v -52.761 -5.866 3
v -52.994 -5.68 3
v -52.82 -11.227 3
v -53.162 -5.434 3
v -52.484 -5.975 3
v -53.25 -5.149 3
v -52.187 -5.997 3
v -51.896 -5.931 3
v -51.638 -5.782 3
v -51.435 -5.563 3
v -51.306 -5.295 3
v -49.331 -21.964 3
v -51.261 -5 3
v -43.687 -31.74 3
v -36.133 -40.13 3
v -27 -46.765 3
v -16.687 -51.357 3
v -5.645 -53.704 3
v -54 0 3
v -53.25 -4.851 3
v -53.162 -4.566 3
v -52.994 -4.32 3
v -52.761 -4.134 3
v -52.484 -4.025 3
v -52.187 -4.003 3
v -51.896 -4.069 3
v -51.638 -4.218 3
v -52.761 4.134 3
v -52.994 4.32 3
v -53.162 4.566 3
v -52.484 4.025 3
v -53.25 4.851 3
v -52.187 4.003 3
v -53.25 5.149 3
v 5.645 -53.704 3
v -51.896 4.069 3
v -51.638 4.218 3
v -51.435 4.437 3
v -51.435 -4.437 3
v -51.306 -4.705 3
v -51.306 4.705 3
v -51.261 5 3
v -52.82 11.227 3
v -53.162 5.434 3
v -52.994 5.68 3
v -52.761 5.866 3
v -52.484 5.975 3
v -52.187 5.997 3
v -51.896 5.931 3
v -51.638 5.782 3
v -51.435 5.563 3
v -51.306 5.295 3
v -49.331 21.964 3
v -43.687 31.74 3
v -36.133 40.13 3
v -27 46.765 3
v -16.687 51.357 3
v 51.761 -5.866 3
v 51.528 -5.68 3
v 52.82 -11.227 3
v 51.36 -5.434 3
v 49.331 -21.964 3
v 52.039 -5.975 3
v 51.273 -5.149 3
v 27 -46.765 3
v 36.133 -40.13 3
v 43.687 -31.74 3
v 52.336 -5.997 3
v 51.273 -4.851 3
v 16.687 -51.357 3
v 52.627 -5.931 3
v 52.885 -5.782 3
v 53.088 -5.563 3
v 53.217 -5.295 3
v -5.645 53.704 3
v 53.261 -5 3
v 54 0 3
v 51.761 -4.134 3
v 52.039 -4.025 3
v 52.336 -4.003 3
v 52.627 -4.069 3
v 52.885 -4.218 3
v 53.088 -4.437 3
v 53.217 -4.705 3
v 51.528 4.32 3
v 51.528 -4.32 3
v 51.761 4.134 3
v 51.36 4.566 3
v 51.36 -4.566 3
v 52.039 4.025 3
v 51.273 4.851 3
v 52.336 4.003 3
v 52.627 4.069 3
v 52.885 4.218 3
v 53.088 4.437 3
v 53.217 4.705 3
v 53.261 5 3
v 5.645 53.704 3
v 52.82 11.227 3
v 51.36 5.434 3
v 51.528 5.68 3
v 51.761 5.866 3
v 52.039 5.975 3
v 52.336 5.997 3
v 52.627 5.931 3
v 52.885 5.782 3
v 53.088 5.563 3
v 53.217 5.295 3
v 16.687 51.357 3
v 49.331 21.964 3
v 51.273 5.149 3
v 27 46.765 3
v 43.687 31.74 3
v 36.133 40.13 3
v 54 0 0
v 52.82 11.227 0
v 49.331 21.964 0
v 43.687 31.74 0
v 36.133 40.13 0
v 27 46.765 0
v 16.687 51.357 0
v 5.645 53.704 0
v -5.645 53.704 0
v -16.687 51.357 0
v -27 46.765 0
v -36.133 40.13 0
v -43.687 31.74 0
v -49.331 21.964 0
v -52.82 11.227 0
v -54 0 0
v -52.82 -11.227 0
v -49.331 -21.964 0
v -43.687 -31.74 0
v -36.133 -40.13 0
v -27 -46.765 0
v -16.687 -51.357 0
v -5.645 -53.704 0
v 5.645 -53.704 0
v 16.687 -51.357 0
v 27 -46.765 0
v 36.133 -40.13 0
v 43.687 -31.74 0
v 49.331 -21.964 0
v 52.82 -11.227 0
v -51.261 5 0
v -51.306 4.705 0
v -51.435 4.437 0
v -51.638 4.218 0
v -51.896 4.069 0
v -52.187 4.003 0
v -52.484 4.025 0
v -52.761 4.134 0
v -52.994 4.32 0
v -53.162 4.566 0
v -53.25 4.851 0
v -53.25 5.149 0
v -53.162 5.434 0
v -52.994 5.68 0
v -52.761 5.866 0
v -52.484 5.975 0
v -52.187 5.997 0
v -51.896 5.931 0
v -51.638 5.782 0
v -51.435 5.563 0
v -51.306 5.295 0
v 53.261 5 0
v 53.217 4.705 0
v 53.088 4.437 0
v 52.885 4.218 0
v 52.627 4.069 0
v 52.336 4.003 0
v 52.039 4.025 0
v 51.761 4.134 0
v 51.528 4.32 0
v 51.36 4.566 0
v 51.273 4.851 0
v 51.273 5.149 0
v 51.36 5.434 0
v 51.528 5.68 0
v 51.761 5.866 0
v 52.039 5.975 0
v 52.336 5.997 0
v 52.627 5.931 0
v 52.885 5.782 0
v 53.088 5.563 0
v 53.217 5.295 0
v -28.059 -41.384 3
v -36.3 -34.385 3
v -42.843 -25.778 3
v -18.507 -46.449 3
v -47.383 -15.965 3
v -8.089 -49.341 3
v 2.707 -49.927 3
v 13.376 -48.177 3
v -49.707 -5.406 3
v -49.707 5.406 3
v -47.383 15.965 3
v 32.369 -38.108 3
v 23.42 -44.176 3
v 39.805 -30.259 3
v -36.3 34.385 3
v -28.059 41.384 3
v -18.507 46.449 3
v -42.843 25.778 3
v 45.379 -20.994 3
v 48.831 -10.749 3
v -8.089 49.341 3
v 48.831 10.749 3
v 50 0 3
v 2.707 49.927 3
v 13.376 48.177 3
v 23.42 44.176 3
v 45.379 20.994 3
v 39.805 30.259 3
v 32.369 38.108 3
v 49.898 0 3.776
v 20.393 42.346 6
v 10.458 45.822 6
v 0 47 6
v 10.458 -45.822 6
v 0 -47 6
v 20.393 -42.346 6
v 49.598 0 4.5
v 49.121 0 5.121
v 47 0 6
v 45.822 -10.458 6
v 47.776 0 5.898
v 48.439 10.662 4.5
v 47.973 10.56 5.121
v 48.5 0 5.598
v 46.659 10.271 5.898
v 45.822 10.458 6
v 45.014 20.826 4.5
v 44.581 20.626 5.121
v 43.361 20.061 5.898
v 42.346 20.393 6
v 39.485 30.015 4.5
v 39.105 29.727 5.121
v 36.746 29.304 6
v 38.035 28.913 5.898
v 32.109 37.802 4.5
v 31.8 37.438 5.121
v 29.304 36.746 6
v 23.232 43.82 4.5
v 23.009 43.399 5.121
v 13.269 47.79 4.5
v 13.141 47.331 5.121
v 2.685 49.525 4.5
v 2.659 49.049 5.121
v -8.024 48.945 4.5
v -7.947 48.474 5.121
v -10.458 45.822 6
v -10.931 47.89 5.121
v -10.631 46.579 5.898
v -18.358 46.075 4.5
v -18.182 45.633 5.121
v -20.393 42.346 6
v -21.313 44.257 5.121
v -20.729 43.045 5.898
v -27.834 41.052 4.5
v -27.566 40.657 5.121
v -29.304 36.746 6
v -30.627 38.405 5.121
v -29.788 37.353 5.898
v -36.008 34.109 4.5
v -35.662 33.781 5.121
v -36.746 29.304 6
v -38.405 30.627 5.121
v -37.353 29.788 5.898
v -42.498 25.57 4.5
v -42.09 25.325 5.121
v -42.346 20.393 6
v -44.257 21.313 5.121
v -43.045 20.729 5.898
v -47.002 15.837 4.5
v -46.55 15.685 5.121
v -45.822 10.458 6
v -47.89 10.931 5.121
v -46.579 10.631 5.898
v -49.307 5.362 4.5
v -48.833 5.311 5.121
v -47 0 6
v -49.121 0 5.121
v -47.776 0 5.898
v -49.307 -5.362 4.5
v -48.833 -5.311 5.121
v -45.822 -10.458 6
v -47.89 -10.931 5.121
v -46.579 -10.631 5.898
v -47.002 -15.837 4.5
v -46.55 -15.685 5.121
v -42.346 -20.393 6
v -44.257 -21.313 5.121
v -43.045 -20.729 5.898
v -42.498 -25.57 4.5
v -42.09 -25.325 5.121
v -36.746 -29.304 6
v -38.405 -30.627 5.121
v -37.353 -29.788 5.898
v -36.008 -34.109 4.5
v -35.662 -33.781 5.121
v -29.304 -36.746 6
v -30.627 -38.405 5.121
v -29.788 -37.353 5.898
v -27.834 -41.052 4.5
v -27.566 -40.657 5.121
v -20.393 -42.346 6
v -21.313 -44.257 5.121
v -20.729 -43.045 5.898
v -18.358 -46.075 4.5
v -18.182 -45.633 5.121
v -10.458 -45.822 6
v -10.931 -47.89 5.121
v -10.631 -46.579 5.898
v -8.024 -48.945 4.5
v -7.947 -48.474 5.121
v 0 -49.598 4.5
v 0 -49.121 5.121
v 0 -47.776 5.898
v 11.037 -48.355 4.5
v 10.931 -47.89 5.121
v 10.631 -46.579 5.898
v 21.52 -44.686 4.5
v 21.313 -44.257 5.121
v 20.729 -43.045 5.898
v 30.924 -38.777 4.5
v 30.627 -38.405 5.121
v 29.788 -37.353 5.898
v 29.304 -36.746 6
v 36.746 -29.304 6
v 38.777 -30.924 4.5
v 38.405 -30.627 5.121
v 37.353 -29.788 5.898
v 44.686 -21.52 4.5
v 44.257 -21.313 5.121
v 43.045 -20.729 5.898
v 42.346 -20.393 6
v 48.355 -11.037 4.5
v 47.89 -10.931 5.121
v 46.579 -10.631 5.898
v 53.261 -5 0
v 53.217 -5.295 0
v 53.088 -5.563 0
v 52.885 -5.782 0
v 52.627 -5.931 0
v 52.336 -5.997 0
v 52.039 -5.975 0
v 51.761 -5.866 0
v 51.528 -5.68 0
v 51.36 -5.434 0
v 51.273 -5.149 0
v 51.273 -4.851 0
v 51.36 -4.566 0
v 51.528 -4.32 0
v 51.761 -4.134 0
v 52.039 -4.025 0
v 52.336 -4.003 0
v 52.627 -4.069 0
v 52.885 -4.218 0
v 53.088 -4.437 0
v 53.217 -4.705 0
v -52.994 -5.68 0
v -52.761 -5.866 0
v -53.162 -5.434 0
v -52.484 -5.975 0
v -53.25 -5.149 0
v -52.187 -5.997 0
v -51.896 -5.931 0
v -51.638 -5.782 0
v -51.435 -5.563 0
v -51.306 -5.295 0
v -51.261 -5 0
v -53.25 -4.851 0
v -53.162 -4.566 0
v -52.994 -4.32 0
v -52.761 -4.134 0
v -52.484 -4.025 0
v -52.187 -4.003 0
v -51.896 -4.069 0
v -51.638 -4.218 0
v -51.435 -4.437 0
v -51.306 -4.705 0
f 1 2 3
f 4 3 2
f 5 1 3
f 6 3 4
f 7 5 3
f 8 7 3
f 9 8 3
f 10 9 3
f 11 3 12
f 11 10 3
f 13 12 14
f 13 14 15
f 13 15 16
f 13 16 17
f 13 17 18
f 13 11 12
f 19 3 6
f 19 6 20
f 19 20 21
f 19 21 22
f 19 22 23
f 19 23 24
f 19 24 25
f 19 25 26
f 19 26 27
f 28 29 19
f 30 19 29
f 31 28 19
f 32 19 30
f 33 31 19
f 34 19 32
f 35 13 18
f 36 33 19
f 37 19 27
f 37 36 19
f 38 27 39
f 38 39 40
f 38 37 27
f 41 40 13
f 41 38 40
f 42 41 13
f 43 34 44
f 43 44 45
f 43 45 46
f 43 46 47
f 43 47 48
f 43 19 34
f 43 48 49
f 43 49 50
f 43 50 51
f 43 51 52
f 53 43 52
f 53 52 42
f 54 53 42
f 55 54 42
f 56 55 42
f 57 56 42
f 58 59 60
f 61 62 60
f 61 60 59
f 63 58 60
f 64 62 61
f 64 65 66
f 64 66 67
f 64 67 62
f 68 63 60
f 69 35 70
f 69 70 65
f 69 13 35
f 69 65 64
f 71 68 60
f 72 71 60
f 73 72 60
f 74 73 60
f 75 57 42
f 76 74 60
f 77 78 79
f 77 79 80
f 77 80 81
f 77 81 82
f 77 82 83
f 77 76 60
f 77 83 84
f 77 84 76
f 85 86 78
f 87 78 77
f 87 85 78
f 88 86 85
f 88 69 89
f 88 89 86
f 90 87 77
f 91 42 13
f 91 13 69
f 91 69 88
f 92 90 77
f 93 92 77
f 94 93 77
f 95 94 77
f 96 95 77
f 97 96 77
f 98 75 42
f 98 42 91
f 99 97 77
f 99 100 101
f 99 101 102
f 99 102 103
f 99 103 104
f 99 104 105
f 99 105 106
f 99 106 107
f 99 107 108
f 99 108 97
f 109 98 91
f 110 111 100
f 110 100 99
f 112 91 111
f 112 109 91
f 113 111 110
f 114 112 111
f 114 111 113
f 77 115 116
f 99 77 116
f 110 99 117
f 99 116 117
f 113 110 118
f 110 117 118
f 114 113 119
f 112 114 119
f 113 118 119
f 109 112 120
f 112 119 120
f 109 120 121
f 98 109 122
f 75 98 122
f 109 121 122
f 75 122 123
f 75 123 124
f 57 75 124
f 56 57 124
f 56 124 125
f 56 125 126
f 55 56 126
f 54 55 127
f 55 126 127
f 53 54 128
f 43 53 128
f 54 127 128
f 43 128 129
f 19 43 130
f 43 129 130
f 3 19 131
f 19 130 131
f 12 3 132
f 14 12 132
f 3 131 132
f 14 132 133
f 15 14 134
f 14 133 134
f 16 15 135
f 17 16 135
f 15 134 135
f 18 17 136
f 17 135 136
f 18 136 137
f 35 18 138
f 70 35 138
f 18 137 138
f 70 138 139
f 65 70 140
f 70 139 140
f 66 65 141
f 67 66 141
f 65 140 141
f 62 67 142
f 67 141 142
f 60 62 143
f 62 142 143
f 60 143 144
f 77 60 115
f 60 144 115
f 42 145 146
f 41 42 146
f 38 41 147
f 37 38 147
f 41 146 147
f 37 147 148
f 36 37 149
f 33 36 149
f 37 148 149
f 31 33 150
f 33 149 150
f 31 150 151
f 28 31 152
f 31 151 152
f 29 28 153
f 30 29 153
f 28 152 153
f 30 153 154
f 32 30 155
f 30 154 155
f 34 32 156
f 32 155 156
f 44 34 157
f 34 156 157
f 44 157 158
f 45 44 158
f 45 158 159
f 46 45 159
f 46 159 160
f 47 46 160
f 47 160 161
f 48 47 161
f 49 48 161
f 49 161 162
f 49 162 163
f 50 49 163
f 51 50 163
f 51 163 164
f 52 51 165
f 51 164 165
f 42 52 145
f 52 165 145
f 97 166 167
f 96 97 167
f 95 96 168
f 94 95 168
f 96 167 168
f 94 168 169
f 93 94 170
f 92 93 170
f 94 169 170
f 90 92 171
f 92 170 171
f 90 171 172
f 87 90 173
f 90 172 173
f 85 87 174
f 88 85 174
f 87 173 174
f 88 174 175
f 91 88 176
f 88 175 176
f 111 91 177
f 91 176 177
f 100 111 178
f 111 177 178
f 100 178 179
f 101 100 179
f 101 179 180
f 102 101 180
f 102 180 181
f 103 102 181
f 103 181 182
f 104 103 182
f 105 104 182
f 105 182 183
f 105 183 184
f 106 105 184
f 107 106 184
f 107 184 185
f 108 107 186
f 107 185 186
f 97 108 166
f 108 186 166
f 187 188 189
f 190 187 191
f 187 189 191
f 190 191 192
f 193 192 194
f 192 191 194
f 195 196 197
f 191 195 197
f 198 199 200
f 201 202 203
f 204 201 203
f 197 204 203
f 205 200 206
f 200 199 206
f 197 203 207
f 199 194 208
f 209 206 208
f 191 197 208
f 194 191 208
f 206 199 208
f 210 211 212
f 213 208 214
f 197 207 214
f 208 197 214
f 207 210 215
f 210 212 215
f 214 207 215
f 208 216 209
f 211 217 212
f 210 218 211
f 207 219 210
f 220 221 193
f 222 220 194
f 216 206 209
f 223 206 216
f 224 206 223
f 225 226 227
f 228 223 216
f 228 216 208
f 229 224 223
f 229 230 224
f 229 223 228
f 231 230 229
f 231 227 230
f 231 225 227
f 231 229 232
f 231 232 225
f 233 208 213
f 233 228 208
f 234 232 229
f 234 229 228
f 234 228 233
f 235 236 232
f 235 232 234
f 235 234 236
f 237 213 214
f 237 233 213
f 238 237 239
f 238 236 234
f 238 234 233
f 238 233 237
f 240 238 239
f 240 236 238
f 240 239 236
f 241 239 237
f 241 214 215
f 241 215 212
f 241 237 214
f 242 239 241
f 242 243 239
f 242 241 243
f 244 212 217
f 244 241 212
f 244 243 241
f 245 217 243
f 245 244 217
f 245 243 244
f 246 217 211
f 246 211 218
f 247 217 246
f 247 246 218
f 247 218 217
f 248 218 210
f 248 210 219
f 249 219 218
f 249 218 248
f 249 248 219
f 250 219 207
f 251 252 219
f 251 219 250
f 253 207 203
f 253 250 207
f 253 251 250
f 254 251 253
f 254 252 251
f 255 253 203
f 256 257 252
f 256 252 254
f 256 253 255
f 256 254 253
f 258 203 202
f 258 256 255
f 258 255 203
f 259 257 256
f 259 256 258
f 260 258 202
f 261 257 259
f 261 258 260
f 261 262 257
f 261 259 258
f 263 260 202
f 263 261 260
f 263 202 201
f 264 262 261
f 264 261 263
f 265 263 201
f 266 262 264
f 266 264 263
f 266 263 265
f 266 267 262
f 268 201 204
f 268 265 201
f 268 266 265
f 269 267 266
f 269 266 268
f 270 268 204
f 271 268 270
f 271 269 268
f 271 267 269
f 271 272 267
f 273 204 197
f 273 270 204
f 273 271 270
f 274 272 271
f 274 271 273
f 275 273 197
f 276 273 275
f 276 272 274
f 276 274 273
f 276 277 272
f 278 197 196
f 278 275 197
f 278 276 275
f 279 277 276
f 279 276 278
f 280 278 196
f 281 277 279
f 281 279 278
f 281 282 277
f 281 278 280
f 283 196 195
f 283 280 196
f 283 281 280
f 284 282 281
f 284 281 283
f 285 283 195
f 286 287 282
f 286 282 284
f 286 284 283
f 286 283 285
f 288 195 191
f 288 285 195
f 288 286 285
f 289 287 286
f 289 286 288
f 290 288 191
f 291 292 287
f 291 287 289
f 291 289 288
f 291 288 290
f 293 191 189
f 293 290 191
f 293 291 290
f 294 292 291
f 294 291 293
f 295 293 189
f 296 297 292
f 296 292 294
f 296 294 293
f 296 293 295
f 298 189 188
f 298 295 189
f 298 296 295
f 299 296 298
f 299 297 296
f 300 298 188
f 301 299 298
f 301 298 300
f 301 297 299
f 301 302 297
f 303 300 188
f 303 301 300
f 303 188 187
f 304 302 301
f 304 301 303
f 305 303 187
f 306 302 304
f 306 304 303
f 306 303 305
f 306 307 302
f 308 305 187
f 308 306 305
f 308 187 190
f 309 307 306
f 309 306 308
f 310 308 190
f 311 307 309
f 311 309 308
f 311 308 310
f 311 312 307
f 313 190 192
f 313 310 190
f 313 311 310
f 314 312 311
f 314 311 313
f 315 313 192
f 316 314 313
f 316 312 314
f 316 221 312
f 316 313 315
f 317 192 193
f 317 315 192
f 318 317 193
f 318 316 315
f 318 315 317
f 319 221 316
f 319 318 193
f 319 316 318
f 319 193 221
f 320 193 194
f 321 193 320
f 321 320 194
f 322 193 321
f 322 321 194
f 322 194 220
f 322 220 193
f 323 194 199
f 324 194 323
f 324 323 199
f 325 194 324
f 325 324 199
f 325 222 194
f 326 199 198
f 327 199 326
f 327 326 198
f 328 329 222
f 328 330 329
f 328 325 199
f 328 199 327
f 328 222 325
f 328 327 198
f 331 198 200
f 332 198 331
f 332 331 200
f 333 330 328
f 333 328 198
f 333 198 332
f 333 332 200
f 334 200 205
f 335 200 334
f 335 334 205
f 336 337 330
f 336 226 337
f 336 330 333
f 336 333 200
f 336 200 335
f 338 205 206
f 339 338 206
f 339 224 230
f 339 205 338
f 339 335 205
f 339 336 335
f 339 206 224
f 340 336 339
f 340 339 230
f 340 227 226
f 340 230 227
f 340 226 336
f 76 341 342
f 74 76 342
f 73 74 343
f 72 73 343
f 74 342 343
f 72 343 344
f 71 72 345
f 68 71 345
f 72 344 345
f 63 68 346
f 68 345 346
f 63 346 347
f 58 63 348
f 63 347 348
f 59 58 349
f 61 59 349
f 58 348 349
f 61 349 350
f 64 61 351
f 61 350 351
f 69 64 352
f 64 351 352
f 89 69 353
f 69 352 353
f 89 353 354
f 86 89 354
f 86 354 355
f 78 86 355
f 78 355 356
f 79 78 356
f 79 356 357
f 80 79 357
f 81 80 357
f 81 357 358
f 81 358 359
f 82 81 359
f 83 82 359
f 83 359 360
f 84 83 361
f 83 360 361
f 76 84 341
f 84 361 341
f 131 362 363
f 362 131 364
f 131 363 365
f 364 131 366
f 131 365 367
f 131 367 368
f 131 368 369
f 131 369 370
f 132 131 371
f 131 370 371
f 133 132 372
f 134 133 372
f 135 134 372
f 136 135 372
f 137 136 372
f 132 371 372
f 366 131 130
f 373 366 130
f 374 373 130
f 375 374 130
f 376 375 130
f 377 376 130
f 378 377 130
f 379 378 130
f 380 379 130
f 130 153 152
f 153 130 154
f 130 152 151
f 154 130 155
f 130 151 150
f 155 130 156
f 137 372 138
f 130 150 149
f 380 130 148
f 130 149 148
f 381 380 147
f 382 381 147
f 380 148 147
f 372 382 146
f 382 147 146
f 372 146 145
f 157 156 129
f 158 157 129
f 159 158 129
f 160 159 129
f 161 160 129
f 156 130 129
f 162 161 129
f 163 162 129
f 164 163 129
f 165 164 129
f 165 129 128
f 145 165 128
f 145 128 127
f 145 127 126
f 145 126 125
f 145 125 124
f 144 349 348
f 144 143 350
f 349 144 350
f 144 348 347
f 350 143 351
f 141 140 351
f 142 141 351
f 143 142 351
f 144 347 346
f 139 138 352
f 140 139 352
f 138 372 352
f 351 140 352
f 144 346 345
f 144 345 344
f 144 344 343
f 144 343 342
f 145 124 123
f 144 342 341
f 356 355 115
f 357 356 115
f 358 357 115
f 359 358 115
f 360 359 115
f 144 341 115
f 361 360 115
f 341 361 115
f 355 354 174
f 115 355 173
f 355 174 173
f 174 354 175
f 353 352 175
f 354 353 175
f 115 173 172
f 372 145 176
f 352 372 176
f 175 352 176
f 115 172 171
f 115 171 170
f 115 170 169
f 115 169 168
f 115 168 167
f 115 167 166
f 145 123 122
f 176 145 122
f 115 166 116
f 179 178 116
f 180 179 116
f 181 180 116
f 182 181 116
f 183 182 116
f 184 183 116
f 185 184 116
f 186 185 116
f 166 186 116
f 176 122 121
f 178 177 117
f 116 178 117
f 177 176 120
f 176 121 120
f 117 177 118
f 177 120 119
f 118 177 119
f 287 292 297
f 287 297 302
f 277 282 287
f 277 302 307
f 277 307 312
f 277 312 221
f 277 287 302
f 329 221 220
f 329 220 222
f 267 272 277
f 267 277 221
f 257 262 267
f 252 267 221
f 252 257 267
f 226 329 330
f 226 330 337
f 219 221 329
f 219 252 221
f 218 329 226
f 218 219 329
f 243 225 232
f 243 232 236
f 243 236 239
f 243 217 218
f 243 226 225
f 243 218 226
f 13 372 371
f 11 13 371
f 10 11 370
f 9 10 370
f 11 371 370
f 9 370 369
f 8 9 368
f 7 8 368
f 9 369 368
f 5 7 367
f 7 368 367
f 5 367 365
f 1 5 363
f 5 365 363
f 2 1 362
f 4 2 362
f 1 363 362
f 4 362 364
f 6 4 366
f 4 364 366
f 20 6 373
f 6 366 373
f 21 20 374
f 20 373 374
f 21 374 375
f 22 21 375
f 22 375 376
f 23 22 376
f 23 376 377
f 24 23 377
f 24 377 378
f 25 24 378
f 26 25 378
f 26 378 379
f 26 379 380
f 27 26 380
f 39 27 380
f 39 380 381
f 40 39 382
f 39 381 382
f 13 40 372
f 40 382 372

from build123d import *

# Parameters (mm, degrees)
F0_R     = 54
F1_DEPTH = 3
F2_R     = 50
F3_DEPTH = 3
F4_R     = 2.99999
F5_R     = 1
F6_DEPTH = 3


# Not quite as in the source:
# - a fillet or chamfer is up to 0.001 mm smaller than in the source, because OpenCascade refuses the exact size


with BuildPart() as f1:
    # F0 (on Top) → F1 (new body)
    with BuildSketch(Plane.XY):
        Circle(F0_R)
    extrude(amount=F1_DEPTH)

    # F5 (on face) → F6 (cut, through all)
    with BuildSketch(Plane(origin=(0, 0, 0), x_dir=(1, 0, 0), z_dir=(0, 0, -1))):
        with Locations((-52.2613624009, 5)):
            Circle(F5_R)
        with Locations((-52.2613624009, -5)):
            Circle(F5_R)
        with Locations((52.2613624009, -5)):
            Circle(F5_R)
        with Locations((52.2613624009, 5)):
            Circle(F5_R)
    extrude(amount=-F6_DEPTH, mode=Mode.SUBTRACT)


with BuildPart() as f3:
    # F2 (on face) → F3 (new body)
    with BuildSketch(Plane.XY.offset(3)):
        Circle(F2_R)
    extrude(amount=F3_DEPTH)

    # F4 (radius 3 in the source; OpenCascade refuses exactly that, so slightly less here)
    f4_edges = [f3.edges().sort_by_distance(p)[0] for p in [
        (-50, 0, 6),
    ]]
    fillet(f4_edges, radius=F4_R)


solid = Compound([f1.part, f3.part])
